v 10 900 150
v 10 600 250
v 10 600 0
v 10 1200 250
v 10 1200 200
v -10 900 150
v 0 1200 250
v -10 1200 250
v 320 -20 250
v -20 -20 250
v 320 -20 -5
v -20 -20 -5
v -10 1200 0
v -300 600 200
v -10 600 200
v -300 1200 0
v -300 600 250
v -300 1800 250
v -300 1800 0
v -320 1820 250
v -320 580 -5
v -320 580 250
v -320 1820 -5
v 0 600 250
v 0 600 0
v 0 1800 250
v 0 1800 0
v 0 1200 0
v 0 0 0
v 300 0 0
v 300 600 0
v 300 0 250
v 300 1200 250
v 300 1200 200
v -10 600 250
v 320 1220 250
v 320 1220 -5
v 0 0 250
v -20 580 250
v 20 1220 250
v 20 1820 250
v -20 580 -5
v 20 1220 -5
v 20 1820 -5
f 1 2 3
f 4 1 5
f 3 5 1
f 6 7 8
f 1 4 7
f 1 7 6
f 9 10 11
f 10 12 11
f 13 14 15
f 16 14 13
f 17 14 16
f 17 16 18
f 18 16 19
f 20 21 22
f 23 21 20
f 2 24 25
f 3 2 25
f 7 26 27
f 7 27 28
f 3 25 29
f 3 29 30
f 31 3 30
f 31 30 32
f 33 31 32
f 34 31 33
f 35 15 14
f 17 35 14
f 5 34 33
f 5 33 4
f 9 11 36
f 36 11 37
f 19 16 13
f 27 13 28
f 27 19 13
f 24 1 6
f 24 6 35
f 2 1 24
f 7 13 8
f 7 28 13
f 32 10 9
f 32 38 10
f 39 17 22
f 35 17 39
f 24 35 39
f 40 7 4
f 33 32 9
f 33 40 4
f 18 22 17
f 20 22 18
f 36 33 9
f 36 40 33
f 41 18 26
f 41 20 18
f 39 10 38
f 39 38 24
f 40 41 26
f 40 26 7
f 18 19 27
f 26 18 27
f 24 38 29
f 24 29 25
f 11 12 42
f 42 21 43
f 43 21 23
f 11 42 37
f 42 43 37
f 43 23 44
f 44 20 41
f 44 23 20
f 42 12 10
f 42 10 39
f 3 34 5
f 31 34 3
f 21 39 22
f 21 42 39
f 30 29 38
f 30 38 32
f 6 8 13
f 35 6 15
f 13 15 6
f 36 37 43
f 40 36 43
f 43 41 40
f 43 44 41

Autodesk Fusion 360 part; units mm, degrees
sketch "Sketch1" plane through (0, 0, 0) normal (0, 0, 1) x (1, 0, 0)
  line L0 (0, 0) -> (300, 0)
  line L1 (300, 0) -> (300, 1200)
  line L2 (300, 1200) -> (0, 1200)
  line L3 (0, 600) -> (-300, 600)
  line L4 (-300, 600) -> (-300, 1800)
  line L5 (-300, 1800) -> (0, 1800)
  line L6 (0, 1800) -> (0, 1200)
  line L7 (0, 0) -> (0, 600)
  line L8 (20, 1820) -> (20, 1220)
  line L9 (320, 1220) -> (20, 1220)
  line L10 (320, -20) -> (320, 1220)
  line L11 (-20, -20) -> (320, -20)
  line L12 (-20, -20) -> (-20, 580)
  line L13 (-20, 580) -> (-320, 580)
  line L14 (-320, 580) -> (-320, 1820)
  line L15 (-320, 1820) -> (20, 1820)
  dimension "d1" = 300
  dimension "d2" = 1200
  dimension "d3" = 300
  dimension "d4" = 1200
  dimension "d5" = -20
extrude "Extrude1" add sketch "Sketch1" along normal blind 400 makes body 1
extrude "Extrude2" add sketch "Sketch1" against normal blind 5 separate body contours L0 L1 L2 L3 L4 L5 L6 L7 makes body 2
extrude "Extrude3" add sketch "Sketch1" against normal blind 5 bodies 1 2
extrude "Extrude4" cut 1 faces at (-313.3333, 1400, 400) along direction (0, 0, -1) blind 100 on bodies 1 bodies 1
extrude "Extrude5" cut 1 faces at (-313.3333, 1400, 300) along direction (0, 0, -1) blind 50 on bodies 1 bodies 1
sketch "Sketch2" plane through (300, 0, 0) normal (-1, 0, 0) x (0, -1, 0)
  line L0 (0, 250) -> (-1200, 250)
  line L1 (-1200, 250) -> (-1200, 0)
  line L2 (-1200, 0) -> (0, 0)
  line L3 (0, 0) -> (0, 250)
  line L4 (-600, 250) -> (-600, 0) construction
  line L5 (-1200, 250) -> (-1200, 200) construction
  line L6 (-1200, 200) -> (-600, 0)
  dimension "d16" = 50
extrude "Extrude6" add sketch "Sketch2" along normal blind 300 contours L1 L2 L6 bodies 1
sketch "Sketch3" plane through (-300, 0, 0) normal (1, 0, 0) x (0, 1, 0)
  line L0 (1800, 250) -> (600, 250)
  line L1 (600, 250) -> (600, 0)
  line L2 (600, 0) -> (1800, 0)
  line L3 (1800, 0) -> (1800, 250)
  line L4 (1200, 250) -> (1200, 0) construction
  line L5 (600, 250) -> (600, 200) construction
  line L6 (600, 200) -> (1200, 0)
  dimension "d19" = 50
extrude "Extrude7" add sketch "Sketch3" along normal blind 300 contours L1 L2 L6 bodies 1
sketch "Sketch4" plane through (0, 0, 0) normal (-1, 0, 0) x (0, -1, 0)
  line L0 (-1200, 0) -> (-900, 100)
  line L1 (-900, 100) -> (-1200, 200)
  line L2 (-1200, 200) -> (-1200, 250)
  line L3 (-1200, 250) -> (-1800, 250)
  line L4 (-1800, 250) -> (-1800, 0)
  line L5 (-1800, 0) -> (-1200, 0)
  line L6 (-900, 100) -> (-900, 150)
  line L7 (-1200, 250) -> (-900, 150)
  dimension "d22" = 50
sketch "Sketch5" plane through (0, 0, 0) normal (1, 0, 0) x (0, 1, 0)
  line L0 (600, 250) -> (0, 250)
  line L1 (0, 250) -> (0, 0)
  line L2 (0, 0) -> (600, 0)
  line L3 (600, 0) -> (900, 100)
  line L4 (900, 100) -> (600, 200)
  line L5 (600, 200) -> (600, 250)
  line L6 (900, 100) -> (900, 150)
  line L7 (900, 150) -> (600, 250)
  dimension "d23" = 50
extrude "Extrude8" add sketch "Sketch5" sketch "Sketch4" against normal mid plane 20 contours L4 L5 L6 L7 of sketch 2 contours L1 L2 L6 L7 bodies 1
sketch "Sketch6" plane through (0, 0, 0) normal (-1, 0, 0) x (0, -1, 0)
  line L0 (-1200, 0) -> (-900, 100)
  line L1 (-900, 100) -> (-1200, 200)
  line L2 (-1200, 200) -> (-1200, 250)
  line L3 (-1200, 250) -> (-1800, 250)
  line L4 (-1800, 250) -> (-1800, 0)
  line L5 (-1800, 0) -> (-1200, 0)
  line L6 (-1200, 0) -> (-1200, 200)
extrude "Extrude9" add sketch "Sketch6" along normal blind 10 contours L0 L1 L6 bodies 1
sketch "Sketch7" plane through (0, 0, 0) normal (1, 0, 0) x (0, 1, 0)
  line L0 (600, 250) -> (0, 250)
  line L1 (0, 250) -> (0, 0)
  line L2 (0, 0) -> (600, 0)
  line L3 (600, 0) -> (900, 100)
  line L4 (900, 100) -> (600, 200)
  line L5 (600, 200) -> (600, 250)
  line L6 (600, 200) -> (600, 0)
extrude "Extrude10" add sketch "Sketch7" along normal blind 10 contours L3 L4 L6 bodies 1
